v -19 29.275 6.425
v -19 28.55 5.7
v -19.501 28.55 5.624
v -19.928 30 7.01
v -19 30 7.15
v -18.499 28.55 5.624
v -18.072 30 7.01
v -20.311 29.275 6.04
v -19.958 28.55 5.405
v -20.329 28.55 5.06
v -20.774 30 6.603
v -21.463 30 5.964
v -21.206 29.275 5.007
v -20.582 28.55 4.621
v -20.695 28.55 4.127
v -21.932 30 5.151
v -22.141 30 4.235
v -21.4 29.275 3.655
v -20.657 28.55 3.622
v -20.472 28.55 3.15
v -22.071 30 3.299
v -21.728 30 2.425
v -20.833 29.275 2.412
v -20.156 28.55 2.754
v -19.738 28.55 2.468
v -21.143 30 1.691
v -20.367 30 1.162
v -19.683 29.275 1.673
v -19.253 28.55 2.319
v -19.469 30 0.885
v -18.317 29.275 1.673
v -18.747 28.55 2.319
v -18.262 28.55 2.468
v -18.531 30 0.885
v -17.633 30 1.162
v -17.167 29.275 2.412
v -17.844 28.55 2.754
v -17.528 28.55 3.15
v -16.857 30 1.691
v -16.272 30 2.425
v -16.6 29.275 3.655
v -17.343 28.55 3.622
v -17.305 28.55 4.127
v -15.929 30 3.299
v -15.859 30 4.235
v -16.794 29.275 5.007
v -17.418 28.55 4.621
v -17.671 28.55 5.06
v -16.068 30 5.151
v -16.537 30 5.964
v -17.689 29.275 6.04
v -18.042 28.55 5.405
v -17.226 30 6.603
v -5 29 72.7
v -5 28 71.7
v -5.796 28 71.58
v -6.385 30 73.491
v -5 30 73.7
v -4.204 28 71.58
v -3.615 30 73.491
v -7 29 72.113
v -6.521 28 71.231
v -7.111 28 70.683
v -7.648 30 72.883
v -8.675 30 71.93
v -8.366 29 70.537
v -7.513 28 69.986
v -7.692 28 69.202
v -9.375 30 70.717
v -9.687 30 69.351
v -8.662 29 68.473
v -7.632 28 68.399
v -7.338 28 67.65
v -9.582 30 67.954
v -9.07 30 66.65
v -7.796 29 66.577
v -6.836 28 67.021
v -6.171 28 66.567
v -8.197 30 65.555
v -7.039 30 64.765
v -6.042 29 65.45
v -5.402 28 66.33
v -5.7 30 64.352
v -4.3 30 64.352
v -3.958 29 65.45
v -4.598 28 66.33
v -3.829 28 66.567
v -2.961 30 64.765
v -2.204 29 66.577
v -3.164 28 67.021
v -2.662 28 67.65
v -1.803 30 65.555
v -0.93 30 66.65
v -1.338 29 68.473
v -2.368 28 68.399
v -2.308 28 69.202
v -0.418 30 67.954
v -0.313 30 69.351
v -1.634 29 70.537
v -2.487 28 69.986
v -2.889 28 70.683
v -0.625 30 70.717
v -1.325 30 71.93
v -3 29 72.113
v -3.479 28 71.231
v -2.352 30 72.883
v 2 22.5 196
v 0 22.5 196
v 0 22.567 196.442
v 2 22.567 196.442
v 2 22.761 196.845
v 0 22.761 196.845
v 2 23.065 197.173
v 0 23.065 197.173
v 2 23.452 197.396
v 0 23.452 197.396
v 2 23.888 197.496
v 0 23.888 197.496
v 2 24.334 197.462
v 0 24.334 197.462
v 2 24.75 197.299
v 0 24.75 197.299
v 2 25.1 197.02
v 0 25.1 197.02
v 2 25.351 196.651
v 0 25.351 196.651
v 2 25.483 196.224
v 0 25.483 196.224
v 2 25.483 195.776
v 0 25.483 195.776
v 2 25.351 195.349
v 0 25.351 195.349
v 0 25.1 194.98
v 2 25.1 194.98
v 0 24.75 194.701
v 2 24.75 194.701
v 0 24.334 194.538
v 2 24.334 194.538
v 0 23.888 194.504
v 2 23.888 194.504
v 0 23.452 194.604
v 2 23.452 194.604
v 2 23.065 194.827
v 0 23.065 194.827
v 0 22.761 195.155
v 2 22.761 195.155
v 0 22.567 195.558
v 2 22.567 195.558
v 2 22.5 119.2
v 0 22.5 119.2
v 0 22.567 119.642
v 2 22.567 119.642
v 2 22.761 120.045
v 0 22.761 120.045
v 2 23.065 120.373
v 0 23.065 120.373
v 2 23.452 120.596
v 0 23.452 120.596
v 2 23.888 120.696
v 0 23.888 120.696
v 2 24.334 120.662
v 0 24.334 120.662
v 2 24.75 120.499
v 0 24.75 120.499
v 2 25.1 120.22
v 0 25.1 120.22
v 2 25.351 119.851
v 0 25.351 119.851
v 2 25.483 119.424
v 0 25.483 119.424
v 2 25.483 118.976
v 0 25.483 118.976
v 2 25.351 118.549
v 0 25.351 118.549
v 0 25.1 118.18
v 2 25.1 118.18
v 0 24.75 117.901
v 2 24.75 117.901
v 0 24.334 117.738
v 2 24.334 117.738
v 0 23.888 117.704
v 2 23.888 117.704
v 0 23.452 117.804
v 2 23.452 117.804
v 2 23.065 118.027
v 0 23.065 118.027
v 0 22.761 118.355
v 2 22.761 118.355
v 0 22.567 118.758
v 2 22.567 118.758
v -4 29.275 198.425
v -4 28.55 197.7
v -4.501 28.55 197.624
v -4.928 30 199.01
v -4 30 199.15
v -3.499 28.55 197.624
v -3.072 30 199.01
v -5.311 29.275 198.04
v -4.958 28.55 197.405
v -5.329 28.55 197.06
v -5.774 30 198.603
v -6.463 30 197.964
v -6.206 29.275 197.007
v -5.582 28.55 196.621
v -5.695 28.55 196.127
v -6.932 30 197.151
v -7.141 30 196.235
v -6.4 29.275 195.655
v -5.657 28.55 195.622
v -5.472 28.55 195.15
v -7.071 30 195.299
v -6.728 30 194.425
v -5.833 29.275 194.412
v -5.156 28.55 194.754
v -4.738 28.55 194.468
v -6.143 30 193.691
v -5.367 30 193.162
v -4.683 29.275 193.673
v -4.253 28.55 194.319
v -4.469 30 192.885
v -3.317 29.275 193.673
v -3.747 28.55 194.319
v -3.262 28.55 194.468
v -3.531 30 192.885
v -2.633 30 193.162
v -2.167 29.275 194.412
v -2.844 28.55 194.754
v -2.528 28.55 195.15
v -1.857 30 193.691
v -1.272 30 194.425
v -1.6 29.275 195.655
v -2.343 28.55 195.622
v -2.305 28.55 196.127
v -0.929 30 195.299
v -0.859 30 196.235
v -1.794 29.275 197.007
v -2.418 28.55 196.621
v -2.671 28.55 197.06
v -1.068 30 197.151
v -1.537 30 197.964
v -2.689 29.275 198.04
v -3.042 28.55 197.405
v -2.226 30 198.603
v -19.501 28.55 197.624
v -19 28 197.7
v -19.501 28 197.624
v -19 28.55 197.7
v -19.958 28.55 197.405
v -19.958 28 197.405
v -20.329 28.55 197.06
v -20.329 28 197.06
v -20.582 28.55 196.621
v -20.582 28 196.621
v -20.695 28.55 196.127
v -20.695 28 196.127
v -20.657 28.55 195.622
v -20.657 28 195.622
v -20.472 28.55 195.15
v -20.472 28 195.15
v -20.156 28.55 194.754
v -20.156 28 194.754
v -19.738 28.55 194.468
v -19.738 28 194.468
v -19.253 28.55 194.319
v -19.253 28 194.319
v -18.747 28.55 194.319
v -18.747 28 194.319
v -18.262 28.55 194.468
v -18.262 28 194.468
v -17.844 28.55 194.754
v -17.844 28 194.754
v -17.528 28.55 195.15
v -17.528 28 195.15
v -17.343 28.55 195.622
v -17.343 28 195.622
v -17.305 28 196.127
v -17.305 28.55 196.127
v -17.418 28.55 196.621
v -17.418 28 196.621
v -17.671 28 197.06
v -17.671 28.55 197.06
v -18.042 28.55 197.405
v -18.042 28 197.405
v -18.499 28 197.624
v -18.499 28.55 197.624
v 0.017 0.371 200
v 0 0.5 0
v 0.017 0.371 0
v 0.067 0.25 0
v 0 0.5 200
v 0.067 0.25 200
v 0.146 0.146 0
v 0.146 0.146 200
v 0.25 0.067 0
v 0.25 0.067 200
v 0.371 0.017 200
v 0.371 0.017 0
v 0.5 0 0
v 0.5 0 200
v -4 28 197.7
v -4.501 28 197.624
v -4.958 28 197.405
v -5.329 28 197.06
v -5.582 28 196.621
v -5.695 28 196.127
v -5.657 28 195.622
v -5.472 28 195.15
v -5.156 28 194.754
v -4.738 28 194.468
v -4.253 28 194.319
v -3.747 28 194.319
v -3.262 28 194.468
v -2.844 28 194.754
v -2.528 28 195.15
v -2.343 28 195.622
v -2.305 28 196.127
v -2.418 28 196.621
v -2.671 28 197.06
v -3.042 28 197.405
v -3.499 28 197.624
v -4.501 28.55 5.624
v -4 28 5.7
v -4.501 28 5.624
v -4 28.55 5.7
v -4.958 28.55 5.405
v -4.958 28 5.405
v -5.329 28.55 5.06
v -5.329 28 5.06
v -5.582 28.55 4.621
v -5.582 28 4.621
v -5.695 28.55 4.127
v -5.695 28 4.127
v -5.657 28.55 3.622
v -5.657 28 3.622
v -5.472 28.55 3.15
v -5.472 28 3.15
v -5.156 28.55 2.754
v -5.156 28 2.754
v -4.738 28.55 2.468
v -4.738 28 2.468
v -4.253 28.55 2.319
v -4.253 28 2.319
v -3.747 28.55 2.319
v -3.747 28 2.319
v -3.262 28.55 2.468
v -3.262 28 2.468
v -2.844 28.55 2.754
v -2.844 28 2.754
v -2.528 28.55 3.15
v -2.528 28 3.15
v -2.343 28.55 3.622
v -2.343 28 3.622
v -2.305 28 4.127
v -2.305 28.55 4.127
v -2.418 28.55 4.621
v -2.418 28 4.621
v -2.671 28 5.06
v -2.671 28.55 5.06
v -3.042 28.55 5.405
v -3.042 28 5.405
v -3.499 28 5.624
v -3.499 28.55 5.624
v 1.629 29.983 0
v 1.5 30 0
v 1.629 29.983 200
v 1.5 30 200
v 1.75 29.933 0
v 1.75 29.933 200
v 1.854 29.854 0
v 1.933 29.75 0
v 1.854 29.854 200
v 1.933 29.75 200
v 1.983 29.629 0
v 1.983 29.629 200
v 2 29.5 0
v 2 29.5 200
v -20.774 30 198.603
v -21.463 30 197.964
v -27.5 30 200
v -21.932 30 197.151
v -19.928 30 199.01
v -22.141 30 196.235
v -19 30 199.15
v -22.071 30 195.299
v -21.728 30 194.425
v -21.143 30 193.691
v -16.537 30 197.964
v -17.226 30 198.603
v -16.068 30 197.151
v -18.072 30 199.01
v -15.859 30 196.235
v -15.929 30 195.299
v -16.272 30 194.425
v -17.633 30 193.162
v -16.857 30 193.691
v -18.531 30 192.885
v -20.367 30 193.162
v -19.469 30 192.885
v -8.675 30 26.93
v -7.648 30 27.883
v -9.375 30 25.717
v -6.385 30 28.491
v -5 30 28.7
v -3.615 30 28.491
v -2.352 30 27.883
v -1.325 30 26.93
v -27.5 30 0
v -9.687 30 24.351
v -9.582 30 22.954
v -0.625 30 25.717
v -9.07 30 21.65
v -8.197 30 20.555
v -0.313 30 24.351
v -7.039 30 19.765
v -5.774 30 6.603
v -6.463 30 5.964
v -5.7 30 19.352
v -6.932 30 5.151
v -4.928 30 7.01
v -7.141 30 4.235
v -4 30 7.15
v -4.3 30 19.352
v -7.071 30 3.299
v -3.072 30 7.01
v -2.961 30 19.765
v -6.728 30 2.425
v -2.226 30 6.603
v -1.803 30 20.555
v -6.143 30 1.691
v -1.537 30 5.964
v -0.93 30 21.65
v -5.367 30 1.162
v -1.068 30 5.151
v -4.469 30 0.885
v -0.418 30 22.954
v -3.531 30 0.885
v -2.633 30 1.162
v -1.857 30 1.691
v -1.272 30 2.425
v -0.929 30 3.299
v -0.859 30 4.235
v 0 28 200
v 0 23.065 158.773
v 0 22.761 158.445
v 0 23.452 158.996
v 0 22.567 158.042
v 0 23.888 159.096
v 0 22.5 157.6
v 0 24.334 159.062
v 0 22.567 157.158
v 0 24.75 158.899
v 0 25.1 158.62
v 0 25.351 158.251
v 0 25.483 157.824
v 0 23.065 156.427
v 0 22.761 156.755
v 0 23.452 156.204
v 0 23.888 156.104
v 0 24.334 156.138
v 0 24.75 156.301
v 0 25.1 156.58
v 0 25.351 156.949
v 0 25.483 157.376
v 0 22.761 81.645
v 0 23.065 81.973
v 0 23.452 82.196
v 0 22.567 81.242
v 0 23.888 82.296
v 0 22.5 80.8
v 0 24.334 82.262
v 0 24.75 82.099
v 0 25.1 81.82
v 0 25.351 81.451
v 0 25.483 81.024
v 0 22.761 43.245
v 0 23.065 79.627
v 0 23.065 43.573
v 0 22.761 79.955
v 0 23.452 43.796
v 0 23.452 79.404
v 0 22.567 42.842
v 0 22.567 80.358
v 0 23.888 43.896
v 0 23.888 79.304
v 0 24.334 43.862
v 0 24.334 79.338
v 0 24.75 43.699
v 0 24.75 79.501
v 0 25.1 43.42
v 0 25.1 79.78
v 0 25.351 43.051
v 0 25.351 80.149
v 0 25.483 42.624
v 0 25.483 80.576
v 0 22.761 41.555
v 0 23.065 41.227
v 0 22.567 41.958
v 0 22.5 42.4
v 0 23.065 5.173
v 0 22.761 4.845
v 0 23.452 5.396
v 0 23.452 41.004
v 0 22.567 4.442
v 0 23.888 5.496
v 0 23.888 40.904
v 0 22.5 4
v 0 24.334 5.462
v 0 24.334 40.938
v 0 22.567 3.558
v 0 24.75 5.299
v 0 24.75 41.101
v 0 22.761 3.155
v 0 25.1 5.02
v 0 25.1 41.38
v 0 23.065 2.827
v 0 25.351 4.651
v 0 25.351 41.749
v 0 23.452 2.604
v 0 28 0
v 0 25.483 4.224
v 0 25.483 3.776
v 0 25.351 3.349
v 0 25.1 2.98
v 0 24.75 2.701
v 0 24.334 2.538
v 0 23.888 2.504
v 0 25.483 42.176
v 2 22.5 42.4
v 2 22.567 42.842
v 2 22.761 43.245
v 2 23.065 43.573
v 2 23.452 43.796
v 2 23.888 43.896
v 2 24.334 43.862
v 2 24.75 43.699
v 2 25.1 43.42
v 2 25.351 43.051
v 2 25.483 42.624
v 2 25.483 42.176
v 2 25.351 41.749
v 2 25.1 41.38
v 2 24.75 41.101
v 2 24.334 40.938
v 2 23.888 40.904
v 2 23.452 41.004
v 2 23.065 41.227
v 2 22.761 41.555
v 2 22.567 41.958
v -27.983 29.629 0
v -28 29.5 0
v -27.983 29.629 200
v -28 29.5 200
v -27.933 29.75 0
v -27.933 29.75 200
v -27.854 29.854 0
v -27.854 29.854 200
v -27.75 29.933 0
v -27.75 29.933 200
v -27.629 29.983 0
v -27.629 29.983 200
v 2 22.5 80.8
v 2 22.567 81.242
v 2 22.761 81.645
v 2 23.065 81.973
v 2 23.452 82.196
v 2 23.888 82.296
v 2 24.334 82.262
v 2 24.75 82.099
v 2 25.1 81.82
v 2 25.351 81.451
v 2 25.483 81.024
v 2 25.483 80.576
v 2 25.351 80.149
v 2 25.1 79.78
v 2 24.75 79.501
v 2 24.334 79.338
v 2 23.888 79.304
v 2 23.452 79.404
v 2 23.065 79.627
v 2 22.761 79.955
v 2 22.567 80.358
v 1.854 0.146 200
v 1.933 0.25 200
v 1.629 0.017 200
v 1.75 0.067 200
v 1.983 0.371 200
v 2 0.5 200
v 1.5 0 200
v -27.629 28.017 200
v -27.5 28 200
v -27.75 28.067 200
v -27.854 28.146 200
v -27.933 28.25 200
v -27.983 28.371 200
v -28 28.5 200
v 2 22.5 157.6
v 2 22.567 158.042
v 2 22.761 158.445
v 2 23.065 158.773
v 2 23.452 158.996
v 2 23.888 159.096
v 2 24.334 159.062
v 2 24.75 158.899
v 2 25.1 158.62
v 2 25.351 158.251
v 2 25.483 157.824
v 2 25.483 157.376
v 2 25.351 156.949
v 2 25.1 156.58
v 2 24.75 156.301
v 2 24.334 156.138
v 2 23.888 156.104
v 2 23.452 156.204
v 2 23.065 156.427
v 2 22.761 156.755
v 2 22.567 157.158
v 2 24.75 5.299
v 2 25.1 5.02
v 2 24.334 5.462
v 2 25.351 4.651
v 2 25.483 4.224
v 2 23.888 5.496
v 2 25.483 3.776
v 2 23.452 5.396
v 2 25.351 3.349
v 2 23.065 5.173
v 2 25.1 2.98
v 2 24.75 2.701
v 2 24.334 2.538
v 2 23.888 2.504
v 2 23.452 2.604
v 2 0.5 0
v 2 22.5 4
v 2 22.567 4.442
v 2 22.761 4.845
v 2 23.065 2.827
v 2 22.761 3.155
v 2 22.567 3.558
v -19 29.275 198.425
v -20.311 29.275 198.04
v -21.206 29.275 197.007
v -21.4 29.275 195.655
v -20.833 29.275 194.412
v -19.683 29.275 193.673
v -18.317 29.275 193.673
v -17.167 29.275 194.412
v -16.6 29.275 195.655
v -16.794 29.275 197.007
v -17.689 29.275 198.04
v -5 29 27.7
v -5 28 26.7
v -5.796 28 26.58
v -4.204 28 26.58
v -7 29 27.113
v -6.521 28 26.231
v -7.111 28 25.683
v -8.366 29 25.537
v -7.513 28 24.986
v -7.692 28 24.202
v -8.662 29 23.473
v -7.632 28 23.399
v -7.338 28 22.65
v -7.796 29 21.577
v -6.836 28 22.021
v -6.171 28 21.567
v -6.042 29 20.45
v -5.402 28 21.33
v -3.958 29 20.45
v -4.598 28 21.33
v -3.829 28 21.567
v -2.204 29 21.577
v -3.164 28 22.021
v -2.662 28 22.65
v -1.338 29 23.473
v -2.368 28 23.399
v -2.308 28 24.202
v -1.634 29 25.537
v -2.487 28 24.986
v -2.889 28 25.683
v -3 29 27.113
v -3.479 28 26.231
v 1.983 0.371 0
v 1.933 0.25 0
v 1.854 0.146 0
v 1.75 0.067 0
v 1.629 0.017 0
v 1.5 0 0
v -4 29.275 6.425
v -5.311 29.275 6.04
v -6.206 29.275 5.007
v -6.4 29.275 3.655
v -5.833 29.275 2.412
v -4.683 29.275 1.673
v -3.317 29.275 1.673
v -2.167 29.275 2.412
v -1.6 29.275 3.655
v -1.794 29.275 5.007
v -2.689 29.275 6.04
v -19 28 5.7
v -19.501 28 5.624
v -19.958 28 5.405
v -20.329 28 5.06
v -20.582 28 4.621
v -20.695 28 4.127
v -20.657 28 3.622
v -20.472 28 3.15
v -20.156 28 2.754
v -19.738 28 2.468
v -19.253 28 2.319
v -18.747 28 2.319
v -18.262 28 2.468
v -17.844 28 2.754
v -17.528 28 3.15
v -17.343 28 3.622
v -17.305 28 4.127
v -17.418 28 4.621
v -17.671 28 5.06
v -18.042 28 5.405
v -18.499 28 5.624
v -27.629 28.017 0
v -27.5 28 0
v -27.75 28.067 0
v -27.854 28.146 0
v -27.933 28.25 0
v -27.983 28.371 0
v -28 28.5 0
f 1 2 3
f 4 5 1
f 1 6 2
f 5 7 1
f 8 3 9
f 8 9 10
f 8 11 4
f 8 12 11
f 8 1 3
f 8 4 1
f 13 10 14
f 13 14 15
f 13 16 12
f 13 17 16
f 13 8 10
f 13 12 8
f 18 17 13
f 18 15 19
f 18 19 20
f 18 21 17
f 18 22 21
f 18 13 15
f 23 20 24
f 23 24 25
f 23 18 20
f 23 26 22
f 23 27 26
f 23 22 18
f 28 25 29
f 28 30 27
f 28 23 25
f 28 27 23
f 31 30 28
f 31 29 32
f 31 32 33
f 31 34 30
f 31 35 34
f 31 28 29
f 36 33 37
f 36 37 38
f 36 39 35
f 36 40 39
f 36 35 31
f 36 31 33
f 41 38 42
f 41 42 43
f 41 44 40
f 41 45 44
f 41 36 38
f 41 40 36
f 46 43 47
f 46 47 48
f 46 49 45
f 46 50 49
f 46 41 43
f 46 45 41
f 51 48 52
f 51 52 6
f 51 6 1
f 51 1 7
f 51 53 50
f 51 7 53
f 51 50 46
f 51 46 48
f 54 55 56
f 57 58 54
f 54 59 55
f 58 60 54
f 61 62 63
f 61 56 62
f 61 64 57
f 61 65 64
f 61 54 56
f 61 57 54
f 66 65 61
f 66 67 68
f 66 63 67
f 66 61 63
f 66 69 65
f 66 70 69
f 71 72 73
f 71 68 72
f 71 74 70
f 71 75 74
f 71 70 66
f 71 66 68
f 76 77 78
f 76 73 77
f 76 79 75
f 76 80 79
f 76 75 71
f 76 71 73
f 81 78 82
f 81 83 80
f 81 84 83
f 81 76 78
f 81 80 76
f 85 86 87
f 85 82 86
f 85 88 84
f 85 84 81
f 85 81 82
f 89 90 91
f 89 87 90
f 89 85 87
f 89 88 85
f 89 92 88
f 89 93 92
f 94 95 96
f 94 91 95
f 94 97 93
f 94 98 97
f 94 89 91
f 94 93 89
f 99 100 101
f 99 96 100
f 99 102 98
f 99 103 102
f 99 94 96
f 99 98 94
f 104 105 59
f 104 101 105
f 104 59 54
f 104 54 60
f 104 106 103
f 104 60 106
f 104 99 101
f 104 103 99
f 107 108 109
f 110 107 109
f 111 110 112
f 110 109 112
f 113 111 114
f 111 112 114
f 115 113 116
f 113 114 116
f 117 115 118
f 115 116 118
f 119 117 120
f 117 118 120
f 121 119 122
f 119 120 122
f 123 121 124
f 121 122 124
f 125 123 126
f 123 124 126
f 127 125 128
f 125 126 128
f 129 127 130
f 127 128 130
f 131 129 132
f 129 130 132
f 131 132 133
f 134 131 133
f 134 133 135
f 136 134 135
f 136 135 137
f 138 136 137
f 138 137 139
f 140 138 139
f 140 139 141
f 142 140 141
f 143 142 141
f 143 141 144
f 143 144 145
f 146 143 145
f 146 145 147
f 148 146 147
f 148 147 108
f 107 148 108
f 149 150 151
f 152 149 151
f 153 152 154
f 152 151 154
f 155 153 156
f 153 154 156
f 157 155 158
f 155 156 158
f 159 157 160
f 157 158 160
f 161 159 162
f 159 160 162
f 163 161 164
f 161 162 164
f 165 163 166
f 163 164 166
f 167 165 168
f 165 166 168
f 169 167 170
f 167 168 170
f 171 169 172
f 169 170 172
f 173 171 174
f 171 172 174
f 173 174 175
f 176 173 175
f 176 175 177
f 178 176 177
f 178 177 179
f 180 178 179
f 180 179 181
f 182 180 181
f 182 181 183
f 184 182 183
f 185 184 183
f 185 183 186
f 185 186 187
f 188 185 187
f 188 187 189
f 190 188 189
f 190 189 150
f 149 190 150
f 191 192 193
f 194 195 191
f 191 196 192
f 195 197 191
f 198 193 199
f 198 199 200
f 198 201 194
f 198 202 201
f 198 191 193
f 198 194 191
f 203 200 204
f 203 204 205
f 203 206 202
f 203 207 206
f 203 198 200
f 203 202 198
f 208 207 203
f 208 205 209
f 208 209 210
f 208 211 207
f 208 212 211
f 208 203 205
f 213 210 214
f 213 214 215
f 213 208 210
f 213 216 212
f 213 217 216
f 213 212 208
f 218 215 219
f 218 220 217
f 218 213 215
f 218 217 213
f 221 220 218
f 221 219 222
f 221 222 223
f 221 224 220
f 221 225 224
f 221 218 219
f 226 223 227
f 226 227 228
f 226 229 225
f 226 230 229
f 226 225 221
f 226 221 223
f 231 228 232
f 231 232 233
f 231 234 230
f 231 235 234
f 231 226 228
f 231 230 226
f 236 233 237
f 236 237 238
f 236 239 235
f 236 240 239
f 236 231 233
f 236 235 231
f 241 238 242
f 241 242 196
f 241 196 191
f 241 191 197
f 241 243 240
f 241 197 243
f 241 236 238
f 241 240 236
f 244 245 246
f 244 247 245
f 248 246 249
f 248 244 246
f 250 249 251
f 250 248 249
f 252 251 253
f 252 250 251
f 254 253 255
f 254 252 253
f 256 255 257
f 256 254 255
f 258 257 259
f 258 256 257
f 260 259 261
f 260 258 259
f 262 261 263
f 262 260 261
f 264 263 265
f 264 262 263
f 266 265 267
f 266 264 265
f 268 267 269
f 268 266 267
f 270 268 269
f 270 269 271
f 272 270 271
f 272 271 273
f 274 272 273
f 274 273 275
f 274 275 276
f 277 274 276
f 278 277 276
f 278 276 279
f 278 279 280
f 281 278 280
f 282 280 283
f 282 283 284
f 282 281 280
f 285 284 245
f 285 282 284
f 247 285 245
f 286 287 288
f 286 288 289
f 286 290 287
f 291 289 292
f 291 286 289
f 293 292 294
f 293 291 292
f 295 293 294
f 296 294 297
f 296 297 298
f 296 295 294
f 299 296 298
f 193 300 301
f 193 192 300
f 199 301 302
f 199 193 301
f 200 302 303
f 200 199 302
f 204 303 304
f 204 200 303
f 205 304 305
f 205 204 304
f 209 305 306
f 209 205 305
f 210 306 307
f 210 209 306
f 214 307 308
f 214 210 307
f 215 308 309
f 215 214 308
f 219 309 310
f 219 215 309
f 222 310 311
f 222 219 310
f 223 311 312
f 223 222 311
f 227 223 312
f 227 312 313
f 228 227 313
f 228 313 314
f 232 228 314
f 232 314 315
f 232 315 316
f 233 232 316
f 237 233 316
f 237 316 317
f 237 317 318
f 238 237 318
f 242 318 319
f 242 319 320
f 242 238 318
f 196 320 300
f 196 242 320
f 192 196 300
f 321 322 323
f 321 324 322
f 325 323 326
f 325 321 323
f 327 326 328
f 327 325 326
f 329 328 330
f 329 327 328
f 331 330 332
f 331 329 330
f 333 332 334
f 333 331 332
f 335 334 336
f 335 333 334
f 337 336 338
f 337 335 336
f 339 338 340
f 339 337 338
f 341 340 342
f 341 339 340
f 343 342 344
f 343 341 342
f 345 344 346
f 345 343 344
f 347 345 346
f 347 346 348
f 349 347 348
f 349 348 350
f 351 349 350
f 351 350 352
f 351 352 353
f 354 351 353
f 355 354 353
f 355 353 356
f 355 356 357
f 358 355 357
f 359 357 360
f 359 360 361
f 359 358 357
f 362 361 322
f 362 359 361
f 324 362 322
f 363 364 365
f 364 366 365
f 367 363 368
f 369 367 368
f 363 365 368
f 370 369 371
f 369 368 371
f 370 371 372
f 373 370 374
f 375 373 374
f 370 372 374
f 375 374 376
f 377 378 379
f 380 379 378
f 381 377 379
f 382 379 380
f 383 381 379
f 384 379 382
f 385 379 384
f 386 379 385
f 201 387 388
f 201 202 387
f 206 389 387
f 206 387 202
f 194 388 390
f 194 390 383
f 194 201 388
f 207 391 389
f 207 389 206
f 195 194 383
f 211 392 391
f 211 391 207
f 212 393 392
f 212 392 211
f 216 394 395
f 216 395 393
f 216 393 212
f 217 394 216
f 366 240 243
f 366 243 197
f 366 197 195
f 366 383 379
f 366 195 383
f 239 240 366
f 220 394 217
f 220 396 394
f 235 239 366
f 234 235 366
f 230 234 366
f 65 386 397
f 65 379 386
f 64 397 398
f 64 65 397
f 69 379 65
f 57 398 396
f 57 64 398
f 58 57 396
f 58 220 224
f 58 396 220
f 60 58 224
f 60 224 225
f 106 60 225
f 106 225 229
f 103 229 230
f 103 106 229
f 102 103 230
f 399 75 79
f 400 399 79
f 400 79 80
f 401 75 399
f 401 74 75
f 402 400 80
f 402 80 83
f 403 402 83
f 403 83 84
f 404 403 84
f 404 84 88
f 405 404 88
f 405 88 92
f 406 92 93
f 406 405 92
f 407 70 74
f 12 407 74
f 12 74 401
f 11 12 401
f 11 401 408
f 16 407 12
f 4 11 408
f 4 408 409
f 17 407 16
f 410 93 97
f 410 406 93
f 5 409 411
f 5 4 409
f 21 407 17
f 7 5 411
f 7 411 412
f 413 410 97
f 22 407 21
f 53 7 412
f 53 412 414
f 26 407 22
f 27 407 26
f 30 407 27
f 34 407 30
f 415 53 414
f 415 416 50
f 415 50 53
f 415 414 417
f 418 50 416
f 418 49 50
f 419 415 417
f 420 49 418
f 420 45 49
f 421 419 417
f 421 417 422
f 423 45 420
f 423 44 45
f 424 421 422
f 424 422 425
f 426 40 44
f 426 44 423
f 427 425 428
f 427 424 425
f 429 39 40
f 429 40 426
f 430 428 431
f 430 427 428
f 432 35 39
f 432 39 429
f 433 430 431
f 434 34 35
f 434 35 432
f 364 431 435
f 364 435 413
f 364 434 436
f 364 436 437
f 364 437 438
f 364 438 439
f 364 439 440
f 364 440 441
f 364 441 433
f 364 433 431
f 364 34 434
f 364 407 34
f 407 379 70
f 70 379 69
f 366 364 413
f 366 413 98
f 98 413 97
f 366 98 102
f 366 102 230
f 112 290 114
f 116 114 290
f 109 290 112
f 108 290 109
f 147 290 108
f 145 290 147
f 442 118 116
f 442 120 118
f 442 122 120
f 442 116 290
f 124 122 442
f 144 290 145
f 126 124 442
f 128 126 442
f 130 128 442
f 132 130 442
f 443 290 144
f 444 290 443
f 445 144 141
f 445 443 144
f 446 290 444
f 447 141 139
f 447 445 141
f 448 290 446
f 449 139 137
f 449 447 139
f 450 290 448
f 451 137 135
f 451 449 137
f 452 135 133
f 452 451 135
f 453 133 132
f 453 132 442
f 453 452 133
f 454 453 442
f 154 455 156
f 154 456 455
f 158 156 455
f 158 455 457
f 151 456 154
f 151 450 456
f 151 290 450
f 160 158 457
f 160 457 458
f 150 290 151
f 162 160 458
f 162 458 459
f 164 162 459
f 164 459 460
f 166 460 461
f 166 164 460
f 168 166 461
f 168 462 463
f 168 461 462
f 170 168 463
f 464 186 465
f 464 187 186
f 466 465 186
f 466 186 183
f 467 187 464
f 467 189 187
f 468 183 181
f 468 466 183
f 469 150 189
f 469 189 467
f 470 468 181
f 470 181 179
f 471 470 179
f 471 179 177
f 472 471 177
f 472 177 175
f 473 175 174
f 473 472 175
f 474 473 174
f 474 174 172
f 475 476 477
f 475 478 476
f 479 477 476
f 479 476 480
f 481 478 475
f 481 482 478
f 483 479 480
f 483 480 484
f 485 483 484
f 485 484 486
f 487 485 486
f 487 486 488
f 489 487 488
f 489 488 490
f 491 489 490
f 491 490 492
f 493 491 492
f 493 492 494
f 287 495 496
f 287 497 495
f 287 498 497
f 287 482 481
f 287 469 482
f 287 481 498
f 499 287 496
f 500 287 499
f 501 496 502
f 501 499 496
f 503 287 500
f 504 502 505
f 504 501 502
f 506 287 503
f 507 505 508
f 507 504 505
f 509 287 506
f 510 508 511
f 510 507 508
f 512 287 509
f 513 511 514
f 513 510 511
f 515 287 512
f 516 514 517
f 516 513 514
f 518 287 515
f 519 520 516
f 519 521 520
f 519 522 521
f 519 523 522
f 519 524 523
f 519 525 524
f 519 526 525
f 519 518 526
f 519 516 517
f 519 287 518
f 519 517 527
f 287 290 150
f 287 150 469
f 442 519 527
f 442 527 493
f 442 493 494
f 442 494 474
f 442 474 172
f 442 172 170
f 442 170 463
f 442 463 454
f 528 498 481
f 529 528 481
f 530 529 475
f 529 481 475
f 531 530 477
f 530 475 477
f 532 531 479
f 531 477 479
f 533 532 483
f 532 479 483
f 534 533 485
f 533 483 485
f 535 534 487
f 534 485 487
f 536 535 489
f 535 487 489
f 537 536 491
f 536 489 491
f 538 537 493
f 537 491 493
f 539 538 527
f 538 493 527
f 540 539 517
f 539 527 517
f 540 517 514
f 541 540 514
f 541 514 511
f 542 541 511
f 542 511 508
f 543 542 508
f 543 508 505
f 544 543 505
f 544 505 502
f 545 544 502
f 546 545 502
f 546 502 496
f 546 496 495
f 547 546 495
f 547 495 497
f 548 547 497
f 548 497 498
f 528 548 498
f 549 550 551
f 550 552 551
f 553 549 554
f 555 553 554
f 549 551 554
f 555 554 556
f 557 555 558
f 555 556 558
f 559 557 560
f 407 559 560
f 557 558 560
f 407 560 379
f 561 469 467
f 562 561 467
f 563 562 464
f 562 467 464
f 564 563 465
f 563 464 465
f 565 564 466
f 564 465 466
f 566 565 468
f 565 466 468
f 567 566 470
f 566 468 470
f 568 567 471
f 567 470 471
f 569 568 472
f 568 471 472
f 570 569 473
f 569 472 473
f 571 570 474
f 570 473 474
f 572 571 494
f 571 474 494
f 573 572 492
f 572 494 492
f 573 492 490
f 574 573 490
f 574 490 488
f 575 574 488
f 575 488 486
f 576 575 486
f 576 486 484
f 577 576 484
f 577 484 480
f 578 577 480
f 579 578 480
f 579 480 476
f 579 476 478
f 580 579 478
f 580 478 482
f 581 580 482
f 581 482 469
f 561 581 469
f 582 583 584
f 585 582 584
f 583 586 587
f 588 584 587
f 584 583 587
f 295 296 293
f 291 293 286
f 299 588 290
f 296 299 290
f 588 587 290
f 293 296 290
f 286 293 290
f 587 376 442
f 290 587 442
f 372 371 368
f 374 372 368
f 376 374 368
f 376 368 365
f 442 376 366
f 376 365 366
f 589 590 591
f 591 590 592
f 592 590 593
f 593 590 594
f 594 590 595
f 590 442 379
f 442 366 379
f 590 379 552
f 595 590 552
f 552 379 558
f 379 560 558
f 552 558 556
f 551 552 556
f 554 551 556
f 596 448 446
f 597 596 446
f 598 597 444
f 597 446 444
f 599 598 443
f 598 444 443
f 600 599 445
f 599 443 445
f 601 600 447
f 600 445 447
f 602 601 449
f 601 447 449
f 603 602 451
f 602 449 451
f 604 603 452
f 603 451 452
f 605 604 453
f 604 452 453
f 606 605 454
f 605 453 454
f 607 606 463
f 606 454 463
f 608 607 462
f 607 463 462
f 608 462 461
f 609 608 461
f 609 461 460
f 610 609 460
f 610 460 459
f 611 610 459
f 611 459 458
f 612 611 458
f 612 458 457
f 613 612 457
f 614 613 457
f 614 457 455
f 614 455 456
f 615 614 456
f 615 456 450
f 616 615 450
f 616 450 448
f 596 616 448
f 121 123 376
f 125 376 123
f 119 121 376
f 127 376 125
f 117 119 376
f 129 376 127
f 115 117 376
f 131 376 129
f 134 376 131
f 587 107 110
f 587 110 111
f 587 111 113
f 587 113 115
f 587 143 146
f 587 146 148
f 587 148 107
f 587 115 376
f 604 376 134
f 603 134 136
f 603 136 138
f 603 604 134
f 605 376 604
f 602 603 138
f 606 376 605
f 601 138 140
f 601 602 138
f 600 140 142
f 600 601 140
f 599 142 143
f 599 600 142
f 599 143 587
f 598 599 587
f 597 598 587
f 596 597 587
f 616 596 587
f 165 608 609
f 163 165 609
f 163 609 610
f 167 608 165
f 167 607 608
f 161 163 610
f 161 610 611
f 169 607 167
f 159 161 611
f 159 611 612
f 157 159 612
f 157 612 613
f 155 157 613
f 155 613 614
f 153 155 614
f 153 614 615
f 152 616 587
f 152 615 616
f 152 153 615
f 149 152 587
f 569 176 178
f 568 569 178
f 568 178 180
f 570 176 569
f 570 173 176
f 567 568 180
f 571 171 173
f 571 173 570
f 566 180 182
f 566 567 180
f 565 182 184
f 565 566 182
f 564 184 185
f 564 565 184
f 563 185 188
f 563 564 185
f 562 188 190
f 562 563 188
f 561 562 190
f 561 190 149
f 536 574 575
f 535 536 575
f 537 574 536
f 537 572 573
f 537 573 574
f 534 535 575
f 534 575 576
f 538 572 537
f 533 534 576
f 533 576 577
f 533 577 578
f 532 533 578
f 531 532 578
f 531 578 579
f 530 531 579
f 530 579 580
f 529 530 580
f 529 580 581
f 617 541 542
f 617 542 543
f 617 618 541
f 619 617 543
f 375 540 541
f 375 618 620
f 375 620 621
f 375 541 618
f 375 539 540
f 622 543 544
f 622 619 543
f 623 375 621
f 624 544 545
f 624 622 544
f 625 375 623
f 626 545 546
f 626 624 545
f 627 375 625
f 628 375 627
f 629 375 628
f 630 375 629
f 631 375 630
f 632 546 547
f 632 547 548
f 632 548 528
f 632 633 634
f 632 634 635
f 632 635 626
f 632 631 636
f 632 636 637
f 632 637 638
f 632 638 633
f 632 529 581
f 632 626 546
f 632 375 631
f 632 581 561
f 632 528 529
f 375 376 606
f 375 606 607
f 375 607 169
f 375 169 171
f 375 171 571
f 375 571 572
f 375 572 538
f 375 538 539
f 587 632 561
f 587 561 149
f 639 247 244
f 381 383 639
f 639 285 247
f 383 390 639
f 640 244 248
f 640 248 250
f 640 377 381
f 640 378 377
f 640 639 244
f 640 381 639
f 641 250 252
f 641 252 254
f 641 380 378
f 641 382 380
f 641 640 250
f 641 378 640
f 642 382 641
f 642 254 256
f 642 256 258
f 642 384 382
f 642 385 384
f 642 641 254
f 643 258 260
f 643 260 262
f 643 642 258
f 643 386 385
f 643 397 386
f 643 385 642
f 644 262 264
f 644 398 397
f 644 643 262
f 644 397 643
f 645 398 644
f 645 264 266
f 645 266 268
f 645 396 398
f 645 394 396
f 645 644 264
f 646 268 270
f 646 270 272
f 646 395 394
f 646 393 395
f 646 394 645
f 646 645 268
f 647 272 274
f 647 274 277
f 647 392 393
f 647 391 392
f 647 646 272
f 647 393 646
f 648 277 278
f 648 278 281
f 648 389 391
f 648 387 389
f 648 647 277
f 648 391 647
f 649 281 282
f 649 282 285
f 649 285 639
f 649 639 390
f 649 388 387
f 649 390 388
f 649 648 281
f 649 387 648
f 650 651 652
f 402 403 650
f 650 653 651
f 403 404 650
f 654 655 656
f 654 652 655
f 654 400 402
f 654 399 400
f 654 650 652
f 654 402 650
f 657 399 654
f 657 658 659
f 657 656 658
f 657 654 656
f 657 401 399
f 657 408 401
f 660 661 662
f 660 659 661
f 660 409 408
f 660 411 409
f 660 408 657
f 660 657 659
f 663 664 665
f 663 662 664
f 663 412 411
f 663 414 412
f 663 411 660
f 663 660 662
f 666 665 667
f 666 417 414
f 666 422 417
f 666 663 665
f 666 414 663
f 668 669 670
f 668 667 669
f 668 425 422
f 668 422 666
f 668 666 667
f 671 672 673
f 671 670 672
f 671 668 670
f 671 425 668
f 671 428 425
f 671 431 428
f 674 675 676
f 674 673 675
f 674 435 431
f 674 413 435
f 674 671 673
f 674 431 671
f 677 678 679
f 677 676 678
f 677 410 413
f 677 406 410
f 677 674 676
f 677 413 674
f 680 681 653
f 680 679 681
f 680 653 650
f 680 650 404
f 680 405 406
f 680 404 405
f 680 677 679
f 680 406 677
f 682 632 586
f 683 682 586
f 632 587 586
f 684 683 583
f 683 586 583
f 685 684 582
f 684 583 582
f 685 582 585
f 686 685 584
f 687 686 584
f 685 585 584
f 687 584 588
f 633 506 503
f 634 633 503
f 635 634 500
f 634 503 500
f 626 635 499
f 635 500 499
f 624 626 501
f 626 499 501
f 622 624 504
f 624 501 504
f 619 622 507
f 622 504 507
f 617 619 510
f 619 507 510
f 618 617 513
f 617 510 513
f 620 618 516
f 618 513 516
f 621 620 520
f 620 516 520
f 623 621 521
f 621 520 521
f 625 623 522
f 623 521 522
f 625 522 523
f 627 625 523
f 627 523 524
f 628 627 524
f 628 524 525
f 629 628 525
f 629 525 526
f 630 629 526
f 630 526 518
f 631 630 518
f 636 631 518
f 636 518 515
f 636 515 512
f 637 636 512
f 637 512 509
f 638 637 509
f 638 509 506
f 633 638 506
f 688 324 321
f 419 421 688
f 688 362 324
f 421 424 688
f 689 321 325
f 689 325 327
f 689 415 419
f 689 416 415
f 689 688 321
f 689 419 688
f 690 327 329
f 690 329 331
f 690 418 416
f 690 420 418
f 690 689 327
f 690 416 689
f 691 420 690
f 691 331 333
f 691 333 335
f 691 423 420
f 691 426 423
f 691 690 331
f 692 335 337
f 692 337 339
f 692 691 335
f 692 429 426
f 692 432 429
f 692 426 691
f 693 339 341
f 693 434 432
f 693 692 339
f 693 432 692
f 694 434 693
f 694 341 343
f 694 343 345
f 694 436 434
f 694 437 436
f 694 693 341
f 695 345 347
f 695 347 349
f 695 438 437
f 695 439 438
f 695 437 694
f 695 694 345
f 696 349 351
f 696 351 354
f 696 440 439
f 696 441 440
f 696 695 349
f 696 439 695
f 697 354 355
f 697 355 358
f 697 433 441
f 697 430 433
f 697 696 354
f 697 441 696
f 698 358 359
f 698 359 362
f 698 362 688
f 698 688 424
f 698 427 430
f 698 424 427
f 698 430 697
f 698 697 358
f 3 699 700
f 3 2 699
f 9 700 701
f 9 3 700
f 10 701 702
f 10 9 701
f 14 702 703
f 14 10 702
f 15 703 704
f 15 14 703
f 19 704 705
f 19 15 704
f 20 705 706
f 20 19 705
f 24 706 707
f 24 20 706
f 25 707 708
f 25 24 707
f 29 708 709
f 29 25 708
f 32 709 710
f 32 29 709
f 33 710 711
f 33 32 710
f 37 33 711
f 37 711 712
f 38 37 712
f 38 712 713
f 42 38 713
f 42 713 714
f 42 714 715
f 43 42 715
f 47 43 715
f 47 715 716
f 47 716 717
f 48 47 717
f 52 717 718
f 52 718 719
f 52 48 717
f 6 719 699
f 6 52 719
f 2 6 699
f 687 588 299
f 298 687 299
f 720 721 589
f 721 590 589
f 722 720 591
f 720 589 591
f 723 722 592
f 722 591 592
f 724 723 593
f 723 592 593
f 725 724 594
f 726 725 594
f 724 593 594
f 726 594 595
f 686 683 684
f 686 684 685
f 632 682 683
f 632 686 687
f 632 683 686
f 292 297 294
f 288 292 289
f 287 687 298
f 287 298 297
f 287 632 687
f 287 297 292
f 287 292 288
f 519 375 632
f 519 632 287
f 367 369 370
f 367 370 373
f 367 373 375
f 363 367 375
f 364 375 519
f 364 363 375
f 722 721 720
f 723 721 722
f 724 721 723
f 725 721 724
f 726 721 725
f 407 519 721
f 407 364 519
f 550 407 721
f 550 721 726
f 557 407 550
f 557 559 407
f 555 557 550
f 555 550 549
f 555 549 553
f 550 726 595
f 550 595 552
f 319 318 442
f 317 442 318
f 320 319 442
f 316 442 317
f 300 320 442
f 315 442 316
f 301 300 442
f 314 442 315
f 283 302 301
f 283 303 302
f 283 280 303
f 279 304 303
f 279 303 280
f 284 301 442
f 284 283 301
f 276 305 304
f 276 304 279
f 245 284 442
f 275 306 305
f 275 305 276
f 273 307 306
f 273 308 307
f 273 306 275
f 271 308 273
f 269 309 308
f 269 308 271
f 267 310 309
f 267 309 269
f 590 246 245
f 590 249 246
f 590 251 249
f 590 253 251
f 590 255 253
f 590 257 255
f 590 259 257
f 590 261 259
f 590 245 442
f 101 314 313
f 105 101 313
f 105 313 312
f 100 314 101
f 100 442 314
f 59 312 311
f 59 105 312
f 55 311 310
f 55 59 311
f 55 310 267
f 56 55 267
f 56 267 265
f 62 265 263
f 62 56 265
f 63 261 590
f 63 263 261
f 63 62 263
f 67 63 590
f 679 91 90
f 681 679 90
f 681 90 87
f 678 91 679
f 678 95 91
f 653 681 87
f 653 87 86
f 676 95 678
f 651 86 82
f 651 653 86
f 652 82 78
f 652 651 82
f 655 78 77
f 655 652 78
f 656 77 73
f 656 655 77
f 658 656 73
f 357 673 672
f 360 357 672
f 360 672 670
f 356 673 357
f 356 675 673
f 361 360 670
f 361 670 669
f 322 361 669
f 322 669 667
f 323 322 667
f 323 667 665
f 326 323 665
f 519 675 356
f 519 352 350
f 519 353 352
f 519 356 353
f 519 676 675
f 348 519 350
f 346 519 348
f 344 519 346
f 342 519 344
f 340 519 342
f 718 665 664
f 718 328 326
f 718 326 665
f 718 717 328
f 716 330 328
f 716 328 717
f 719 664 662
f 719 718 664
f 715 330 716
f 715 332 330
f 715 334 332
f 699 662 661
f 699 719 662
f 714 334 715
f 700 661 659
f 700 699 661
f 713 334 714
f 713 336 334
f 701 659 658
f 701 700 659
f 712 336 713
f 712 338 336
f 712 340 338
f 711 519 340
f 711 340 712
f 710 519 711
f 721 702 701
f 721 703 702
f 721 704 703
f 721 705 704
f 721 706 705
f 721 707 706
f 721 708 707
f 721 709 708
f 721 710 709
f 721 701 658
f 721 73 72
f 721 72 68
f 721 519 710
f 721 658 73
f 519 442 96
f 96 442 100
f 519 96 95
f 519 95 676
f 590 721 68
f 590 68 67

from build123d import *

# Parameters (mm, degrees)
EXTRUDE1_DEPTH                               = 200
FILLET1_R                                    = 0.5
CSK_FOR_M4_COUNTERSUNK_FLAT_HEAD_SCR_2_COUNT = 2
CSK_FOR_M4_COUNTERSUNK_FLAT_HEAD_SCR_2_PITCH = 45
CSK_FOR_M3_COUNTERSUNK_FLAT_HEAD_SCR_2_COUNT = 2
CSK_FOR_M3_COUNTERSUNK_FLAT_HEAD_SCR_2_PITCH = 15
CSK_FOR_M3_COUNTERSUNK_FLAT_HEAD_SCR_3_COUNT = 2
CSK_FOR_M3_COUNTERSUNK_FLAT_HEAD_SCR_3_PITCH = 15
M3_TAPPED_HOLE1_D                            = 3
M3_TAPPED_HOLE1_DEPTH                        = 2.001
LPATTERN1_COUNT                              = 6
LPATTERN1_PITCH                              = 38.4


with BuildPart() as part:
    # Sketch1 → Extrude1 (new body)
    with BuildSketch(Plane.XY):
        Polygon((0, 0), (0, 28), (-28, 28), (-28, 30), (2, 30), (2, 0), align=None)
    extrude(amount=EXTRUDE1_DEPTH)

    # Fillet1
    fillet1_edges = [part.edges().sort_by_distance(p)[0] for p in [
        (-28, 28, 100),
        (-28, 30, 100),
        (2, 30, 100),
        (2, 0, 100),
        (0, 0, 100),
    ]]
    fillet(fillet1_edges, radius=FILLET1_R)

    # Sketch4 → CSK for M4 Countersunk Flat Head Screw1 (revolve, cut)
    with BuildSketch(Plane(origin=(-5, 30, 69), x_dir=(0, 0, 1), z_dir=(1, 0, 0))):
        Polygon((0, 0), (0, 2), (2.25, 2), (2.25, 2.45), (4.7, 0), align=None)
    csk_for_m4_countersunk_flat_head_screw1 = revolve(axis=Axis((-5, 36.35, 69), (0, -1, 0)), mode=Mode.SUBTRACT)

    # CSK for M4 Countersunk Flat Head Scr 2: CSK for M4 Countersunk Flat Head Screw1 ×2
    with Locations(*[(0, 0, -i * CSK_FOR_M4_COUNTERSUNK_FLAT_HEAD_SCR_2_PITCH) for i in range(1, CSK_FOR_M4_COUNTERSUNK_FLAT_HEAD_SCR_2_COUNT)]):
        add(csk_for_m4_countersunk_flat_head_screw1, mode=Mode.SUBTRACT)

    # Sketch5 → CSK for M3 Countersunk Flat Head Screw1 (revolve, cut)
    with BuildSketch(Plane(origin=(-19, 30, 4), x_dir=(0, 0, 1), z_dir=(1, 0, 0))):
        Polygon((0, 0), (0, 2), (1.7, 2), (1.7, 1.45), (3.15, 0), align=None)
    csk_for_m3_countersunk_flat_head_screw1 = revolve(axis=Axis((-19, 36.35, 4), (0, -1, 0)), mode=Mode.SUBTRACT)

    # CSK for M3 Countersunk Flat Head Scr 2: CSK for M3 Countersunk Flat Head Screw1 ×2
    with Locations(*[(i * CSK_FOR_M3_COUNTERSUNK_FLAT_HEAD_SCR_2_PITCH, 0, 0) for i in range(1, CSK_FOR_M3_COUNTERSUNK_FLAT_HEAD_SCR_2_COUNT)]):
        add(csk_for_m3_countersunk_flat_head_screw1, mode=Mode.SUBTRACT)

    # Sketch6 → CSK for M3 Countersunk Flat Head Screw2 (revolve, cut)
    with BuildSketch(Plane(origin=(-19, 30, 196), x_dir=(0, 0, 1), z_dir=(1, 0, 0))):
        Polygon((0, 0), (0, 2), (1.7, 2), (1.7, 1.45), (3.15, 0), align=None)
    csk_for_m3_countersunk_flat_head_screw2 = revolve(axis=Axis((-19, 36.35, 196), (0, -1, 0)), mode=Mode.SUBTRACT)

    # CSK for M3 Countersunk Flat Head Scr 3: CSK for M3 Countersunk Flat Head Screw2 ×2
    with Locations(*[(i * CSK_FOR_M3_COUNTERSUNK_FLAT_HEAD_SCR_3_PITCH, 0, 0) for i in range(1, CSK_FOR_M3_COUNTERSUNK_FLAT_HEAD_SCR_3_COUNT)]):
        add(csk_for_m3_countersunk_flat_head_screw2, mode=Mode.SUBTRACT)

    # M3 Tapped Hole1
    with Locations(Plane(origin=(2, 24, 4), x_dir=(0, 1, 0), z_dir=(1, 0, 0))):
        with Locations((0, 0)):
            m3_tapped_hole1 = Hole(M3_TAPPED_HOLE1_D / 2, depth=M3_TAPPED_HOLE1_DEPTH)

    # LPattern1: M3 Tapped Hole1 ×6
    with Locations(*[(0, 0, i * LPATTERN1_PITCH) for i in range(1, LPATTERN1_COUNT)]):
        add(m3_tapped_hole1, mode=Mode.SUBTRACT)


solid = part.part
